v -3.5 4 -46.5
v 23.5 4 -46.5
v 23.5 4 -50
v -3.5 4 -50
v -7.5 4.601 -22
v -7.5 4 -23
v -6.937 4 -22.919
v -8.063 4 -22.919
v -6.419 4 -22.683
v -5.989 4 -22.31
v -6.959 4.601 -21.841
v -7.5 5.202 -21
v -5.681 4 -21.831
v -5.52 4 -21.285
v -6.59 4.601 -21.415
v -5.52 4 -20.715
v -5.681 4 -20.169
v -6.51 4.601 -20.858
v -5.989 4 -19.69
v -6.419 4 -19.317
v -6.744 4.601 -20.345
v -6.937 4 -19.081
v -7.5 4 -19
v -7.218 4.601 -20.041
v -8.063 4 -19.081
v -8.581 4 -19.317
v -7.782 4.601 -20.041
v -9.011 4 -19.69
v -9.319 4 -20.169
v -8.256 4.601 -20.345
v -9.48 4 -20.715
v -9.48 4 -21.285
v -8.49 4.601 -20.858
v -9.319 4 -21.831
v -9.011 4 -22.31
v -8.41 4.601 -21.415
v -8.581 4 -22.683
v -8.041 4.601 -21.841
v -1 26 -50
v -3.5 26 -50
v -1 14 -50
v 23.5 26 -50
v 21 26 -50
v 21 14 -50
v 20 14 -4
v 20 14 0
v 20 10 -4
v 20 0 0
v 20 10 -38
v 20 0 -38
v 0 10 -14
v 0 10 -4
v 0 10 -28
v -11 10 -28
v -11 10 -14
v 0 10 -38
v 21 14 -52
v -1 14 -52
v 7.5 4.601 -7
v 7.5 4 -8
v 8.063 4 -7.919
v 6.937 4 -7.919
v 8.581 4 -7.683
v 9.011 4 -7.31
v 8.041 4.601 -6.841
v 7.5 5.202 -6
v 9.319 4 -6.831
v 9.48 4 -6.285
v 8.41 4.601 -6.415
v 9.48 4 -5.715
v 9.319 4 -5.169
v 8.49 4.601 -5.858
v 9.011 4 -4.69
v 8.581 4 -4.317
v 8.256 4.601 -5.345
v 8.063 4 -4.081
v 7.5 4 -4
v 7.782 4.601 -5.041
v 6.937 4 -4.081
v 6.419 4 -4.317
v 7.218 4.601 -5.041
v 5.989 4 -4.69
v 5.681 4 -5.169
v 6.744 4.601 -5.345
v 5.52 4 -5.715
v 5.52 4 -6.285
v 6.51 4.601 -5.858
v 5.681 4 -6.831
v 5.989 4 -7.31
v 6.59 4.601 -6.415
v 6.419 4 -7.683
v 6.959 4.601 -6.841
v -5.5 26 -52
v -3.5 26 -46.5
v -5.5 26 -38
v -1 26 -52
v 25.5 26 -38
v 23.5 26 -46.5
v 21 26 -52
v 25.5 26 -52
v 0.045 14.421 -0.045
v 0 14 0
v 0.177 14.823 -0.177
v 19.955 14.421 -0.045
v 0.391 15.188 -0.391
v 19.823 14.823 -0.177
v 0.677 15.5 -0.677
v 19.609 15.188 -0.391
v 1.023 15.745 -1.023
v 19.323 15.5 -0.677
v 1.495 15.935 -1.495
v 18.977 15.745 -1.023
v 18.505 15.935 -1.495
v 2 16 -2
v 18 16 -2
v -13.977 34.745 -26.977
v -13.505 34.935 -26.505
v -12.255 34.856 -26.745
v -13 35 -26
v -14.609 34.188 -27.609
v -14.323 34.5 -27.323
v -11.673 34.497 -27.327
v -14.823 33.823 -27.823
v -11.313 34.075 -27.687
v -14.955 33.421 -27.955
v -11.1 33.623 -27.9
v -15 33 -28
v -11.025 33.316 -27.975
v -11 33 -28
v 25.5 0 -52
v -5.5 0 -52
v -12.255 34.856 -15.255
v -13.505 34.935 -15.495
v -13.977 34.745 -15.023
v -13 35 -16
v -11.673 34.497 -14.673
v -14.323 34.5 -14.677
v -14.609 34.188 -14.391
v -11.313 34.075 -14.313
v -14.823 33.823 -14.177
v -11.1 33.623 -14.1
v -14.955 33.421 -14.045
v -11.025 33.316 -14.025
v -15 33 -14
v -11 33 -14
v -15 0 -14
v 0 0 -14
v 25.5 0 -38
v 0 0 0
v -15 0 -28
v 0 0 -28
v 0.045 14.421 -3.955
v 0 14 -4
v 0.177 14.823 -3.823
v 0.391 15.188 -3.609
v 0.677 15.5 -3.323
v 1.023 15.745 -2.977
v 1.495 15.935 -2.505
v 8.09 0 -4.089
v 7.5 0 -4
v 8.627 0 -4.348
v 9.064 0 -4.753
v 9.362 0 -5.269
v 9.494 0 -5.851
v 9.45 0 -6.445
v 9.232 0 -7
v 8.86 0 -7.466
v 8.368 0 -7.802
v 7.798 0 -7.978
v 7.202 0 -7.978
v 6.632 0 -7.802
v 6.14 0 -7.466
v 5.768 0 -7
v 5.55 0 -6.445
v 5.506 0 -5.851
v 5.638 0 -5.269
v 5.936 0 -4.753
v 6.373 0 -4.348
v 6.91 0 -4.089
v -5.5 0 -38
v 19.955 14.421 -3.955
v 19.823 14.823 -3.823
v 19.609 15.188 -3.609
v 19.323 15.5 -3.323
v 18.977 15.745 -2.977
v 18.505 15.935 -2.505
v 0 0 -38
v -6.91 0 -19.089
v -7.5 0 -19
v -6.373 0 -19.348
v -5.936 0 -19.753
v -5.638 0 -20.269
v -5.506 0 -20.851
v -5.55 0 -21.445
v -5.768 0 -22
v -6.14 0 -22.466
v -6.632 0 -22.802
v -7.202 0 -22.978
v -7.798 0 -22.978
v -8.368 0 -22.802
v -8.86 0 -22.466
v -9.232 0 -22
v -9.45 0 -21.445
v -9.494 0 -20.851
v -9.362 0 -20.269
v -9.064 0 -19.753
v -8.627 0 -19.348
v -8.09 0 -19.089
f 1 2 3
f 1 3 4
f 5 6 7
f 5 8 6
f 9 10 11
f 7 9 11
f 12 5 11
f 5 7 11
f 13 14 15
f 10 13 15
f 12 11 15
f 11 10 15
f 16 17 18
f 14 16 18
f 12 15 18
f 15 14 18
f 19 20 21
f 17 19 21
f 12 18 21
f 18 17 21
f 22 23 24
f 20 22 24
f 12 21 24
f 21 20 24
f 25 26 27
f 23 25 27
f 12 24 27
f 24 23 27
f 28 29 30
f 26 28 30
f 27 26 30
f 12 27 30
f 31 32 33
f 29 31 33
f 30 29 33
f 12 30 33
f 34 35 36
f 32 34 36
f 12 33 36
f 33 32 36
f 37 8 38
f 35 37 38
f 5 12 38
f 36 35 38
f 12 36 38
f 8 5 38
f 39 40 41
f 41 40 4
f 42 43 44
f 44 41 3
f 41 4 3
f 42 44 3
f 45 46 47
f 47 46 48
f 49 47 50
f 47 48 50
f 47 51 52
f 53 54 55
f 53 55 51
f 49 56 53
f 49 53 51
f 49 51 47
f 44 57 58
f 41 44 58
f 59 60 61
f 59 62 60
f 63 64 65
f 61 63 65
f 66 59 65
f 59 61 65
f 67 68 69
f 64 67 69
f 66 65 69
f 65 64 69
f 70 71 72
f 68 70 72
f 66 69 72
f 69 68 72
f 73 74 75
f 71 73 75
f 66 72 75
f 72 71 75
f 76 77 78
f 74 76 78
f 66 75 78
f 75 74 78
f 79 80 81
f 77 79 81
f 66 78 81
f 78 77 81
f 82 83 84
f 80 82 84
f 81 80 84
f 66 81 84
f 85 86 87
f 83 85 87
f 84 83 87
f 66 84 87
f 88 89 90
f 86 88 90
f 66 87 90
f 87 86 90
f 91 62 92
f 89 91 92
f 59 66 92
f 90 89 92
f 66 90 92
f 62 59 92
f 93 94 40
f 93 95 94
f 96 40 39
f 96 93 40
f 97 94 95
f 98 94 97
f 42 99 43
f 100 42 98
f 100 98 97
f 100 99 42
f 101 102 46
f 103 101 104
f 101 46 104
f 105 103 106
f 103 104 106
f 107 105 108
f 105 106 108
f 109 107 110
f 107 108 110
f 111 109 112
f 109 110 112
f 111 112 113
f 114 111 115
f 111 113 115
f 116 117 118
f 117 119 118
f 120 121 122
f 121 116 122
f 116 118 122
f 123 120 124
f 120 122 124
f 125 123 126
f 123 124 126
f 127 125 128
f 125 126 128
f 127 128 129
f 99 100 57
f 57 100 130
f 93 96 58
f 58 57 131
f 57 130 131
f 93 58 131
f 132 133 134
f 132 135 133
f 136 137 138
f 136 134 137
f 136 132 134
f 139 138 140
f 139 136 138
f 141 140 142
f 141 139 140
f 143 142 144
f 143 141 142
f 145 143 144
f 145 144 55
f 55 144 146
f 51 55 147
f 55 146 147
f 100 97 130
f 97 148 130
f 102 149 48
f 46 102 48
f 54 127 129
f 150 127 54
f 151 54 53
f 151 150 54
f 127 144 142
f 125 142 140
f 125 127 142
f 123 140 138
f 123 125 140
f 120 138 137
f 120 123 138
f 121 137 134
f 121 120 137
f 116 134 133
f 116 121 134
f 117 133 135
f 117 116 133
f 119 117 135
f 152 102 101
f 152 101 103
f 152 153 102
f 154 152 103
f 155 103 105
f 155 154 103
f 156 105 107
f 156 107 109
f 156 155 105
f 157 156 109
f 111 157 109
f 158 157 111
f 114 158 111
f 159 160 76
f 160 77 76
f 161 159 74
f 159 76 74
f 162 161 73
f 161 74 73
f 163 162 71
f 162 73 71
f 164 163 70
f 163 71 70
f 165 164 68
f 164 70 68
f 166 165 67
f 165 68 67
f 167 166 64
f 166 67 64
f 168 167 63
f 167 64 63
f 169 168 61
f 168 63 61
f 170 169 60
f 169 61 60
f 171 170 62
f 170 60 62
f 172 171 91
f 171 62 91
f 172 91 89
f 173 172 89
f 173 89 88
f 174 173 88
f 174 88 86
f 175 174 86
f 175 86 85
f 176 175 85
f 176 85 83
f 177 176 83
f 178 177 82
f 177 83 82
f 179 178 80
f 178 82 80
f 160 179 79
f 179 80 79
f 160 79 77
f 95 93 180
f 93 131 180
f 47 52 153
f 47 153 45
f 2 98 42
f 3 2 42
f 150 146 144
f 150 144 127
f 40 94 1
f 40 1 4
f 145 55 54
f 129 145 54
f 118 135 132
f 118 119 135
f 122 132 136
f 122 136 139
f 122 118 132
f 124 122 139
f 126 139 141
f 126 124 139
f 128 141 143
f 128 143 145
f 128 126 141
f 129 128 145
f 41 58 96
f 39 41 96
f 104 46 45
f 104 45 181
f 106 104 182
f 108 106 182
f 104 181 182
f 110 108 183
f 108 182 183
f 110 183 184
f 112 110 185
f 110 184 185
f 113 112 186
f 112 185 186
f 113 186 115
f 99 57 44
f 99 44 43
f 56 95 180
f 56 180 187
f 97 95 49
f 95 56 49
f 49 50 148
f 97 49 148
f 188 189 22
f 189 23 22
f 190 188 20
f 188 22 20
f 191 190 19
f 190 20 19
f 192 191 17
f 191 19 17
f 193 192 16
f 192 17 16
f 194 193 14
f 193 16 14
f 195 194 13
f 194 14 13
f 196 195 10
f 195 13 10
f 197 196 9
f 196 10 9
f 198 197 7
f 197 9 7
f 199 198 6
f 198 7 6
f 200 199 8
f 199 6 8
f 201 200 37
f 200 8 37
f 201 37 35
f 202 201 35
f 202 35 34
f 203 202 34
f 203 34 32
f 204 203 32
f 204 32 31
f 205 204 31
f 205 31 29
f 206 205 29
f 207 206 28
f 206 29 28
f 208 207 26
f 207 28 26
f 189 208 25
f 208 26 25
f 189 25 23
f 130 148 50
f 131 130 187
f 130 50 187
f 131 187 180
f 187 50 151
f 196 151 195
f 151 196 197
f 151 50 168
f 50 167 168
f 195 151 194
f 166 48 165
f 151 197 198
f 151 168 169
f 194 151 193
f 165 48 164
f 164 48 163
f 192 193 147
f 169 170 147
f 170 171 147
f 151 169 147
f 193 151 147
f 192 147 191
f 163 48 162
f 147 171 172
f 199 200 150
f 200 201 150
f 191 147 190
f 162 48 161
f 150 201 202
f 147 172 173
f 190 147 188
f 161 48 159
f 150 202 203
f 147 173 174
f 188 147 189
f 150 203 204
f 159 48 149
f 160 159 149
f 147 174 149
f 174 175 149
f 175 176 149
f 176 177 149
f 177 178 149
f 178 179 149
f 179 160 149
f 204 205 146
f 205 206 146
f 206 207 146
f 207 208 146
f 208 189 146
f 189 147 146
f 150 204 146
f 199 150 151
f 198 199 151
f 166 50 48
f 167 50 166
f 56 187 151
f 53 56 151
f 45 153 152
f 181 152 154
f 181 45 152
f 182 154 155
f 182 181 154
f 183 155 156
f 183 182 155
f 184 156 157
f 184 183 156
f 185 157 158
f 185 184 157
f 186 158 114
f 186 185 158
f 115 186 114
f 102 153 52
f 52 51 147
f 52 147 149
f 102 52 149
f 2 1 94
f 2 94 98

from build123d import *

# Parameters (mm, degrees)
RESSALTO_EXTRUS_O1_DEPTH       = 10
ESBO_O2_W                      = 4
ESBO_O2_H                      = 14
ESBO_O2_W_2                    = 20
ESBO_O2_H_2                    = 4
RESSALTO_EXTRUS_O2_DEPTH       = 25
ESBO_O5_W                      = 20
ESBO_O5_H                      = 42
CORTE_EXTRUS_O1_DEPTH          = 19
FILETE4_R                      = 2
RESSALTO_EXTRUS_O3_DEPTH       = 10
RESSALTO_EXTRUS_O3_DEPTH_BACK  = 4
ESBO_O8_W                      = 31
ESBO_O8_H                      = 4
FURO_DE_DI_METRO_4_0_4_1_D     = 4
FURO_DE_DI_METRO_4_0_4_1_DEPTH = 4
FURO_DE_DI_METRO_4_0_4_1_TIP   = 1.201721238
ESBO_O9_W                      = 27
ESBO_O9_H                      = 3.5
RESSALTO_EXTRUS_O4_DEPTH       = 22
ESBO_O10_W                     = 20
ESBO_O10_H                     = 4
RESSALTO_EXTRUS_O5_DEPTH       = 16
ESBO_O11_W                     = 22
ESBO_O11_H                     = 12
CORTE_EXTRUS_O2_DEPTH          = 2


with BuildPart() as part:
    # Esboço1 → Ressalto-extrusão1 (new body)
    with BuildSketch(Plane(origin=(0, 0, 0), x_dir=(1, 0, 0), z_dir=(0, 1, 0))):
        Polygon((0, 28), (-15, 28), (-15, 14), (0, 14), (0, 0), (20, 0), (20, 42), (0, 42), align=None)
    extrude(amount=RESSALTO_EXTRUS_O1_DEPTH)

    # Esboço2 → Ressalto-extrusão2 (add)
    with BuildSketch(Plane(origin=(0, 10, 0), x_dir=(1, 0, 0), z_dir=(0, 1, 0))):
        with Locations((-13, 21)):
            Rectangle(ESBO_O2_W, ESBO_O2_H)
        with Locations((10, 2)):
            Rectangle(ESBO_O2_W_2, ESBO_O2_H_2)
    extrude(amount=RESSALTO_EXTRUS_O2_DEPTH)

    # Esboço5 → Corte-extrusão1 (cut)
    with BuildSketch(Plane(origin=(0, 35, 0), x_dir=(1, 0, 0), z_dir=(0, 1, 0))):
        with Locations((10, 21)):
            Rectangle(ESBO_O5_W, ESBO_O5_H)
    extrude(amount=-CORTE_EXTRUS_O1_DEPTH, mode=Mode.SUBTRACT)

    # Filete4
    filete4_edges = [part.edges().sort_by_distance(p)[0] for p in [
        (-15, 35, -21),
        (-13, 35, -14),
        (-11, 35, -21),
        (-13, 35, -28),
        (10, 16, -4),
        (20, 16, -2),
        (10, 16, 0),
        (0, 16, -2),
    ]]
    fillet(filete4_edges, radius=FILETE4_R - 0.0001)  # a hair under: the kernel refuses the full size

    # Esboço8 → Ressalto-extrusão3 (add, two sides: drawn at the far end of the back side and taken through both)
    with BuildSketch(Plane(origin=(0, 0, -42), x_dir=(-1, 0, 0), z_dir=(0, 0, -1)).offset(-RESSALTO_EXTRUS_O3_DEPTH_BACK)):
        with Locations((-10, 2)):
            Rectangle(ESBO_O8_W, ESBO_O8_H)
    extrude(amount=RESSALTO_EXTRUS_O3_DEPTH + RESSALTO_EXTRUS_O3_DEPTH_BACK)

    # Furo de diâmetro Ø4.0 (4)1
    with Locations(Plane(origin=(-7.5, 0, -21), x_dir=(0, 0, -1), z_dir=(0, -1, 0))):
        with Locations((0, 0), (-15, 15)):
            Hole(FURO_DE_DI_METRO_4_0_4_1_D / 2, depth=FURO_DE_DI_METRO_4_0_4_1_DEPTH)
            with Locations((0, 0, -(FURO_DE_DI_METRO_4_0_4_1_DEPTH + FURO_DE_DI_METRO_4_0_4_1_TIP / 2))):  # 118° drill point
                Cone(0, FURO_DE_DI_METRO_4_0_4_1_D / 2, FURO_DE_DI_METRO_4_0_4_1_TIP, mode=Mode.SUBTRACT)

    # Esboço9 → Ressalto-extrusão4 (add)
    with BuildSketch(Plane(origin=(0, 4, 0), x_dir=(1, 0, 0), z_dir=(0, 1, 0))):
        Polygon((20, 42), (20, 38), (25.5, 38), (25.5, 52), (-5.5, 52), (-5.5, 38), (0, 38), (0, 42), align=None)
        with Locations((10, 48.25)):
            Rectangle(ESBO_O9_W, ESBO_O9_H, mode=Mode.SUBTRACT)
    extrude(amount=RESSALTO_EXTRUS_O4_DEPTH)

    # Esboço10 → Ressalto-extrusão5 (add)
    with BuildSketch(Plane(origin=(0, 10, 0), x_dir=(1, 0, 0), z_dir=(0, 1, 0))):
        with Locations((10, 40)):
            Rectangle(ESBO_O10_W, ESBO_O10_H)
    extrude(amount=RESSALTO_EXTRUS_O5_DEPTH)

    # Esboço11 → Corte-extrusão2 (cut)
    with BuildSketch(Plane(origin=(0, 0, -52), x_dir=(-1, 0, 0), z_dir=(0, 0, -1))):
        with Locations((-10, 20)):
            Rectangle(ESBO_O11_W, ESBO_O11_H)
    extrude(amount=-CORTE_EXTRUS_O2_DEPTH, mode=Mode.SUBTRACT)


solid = part.part
